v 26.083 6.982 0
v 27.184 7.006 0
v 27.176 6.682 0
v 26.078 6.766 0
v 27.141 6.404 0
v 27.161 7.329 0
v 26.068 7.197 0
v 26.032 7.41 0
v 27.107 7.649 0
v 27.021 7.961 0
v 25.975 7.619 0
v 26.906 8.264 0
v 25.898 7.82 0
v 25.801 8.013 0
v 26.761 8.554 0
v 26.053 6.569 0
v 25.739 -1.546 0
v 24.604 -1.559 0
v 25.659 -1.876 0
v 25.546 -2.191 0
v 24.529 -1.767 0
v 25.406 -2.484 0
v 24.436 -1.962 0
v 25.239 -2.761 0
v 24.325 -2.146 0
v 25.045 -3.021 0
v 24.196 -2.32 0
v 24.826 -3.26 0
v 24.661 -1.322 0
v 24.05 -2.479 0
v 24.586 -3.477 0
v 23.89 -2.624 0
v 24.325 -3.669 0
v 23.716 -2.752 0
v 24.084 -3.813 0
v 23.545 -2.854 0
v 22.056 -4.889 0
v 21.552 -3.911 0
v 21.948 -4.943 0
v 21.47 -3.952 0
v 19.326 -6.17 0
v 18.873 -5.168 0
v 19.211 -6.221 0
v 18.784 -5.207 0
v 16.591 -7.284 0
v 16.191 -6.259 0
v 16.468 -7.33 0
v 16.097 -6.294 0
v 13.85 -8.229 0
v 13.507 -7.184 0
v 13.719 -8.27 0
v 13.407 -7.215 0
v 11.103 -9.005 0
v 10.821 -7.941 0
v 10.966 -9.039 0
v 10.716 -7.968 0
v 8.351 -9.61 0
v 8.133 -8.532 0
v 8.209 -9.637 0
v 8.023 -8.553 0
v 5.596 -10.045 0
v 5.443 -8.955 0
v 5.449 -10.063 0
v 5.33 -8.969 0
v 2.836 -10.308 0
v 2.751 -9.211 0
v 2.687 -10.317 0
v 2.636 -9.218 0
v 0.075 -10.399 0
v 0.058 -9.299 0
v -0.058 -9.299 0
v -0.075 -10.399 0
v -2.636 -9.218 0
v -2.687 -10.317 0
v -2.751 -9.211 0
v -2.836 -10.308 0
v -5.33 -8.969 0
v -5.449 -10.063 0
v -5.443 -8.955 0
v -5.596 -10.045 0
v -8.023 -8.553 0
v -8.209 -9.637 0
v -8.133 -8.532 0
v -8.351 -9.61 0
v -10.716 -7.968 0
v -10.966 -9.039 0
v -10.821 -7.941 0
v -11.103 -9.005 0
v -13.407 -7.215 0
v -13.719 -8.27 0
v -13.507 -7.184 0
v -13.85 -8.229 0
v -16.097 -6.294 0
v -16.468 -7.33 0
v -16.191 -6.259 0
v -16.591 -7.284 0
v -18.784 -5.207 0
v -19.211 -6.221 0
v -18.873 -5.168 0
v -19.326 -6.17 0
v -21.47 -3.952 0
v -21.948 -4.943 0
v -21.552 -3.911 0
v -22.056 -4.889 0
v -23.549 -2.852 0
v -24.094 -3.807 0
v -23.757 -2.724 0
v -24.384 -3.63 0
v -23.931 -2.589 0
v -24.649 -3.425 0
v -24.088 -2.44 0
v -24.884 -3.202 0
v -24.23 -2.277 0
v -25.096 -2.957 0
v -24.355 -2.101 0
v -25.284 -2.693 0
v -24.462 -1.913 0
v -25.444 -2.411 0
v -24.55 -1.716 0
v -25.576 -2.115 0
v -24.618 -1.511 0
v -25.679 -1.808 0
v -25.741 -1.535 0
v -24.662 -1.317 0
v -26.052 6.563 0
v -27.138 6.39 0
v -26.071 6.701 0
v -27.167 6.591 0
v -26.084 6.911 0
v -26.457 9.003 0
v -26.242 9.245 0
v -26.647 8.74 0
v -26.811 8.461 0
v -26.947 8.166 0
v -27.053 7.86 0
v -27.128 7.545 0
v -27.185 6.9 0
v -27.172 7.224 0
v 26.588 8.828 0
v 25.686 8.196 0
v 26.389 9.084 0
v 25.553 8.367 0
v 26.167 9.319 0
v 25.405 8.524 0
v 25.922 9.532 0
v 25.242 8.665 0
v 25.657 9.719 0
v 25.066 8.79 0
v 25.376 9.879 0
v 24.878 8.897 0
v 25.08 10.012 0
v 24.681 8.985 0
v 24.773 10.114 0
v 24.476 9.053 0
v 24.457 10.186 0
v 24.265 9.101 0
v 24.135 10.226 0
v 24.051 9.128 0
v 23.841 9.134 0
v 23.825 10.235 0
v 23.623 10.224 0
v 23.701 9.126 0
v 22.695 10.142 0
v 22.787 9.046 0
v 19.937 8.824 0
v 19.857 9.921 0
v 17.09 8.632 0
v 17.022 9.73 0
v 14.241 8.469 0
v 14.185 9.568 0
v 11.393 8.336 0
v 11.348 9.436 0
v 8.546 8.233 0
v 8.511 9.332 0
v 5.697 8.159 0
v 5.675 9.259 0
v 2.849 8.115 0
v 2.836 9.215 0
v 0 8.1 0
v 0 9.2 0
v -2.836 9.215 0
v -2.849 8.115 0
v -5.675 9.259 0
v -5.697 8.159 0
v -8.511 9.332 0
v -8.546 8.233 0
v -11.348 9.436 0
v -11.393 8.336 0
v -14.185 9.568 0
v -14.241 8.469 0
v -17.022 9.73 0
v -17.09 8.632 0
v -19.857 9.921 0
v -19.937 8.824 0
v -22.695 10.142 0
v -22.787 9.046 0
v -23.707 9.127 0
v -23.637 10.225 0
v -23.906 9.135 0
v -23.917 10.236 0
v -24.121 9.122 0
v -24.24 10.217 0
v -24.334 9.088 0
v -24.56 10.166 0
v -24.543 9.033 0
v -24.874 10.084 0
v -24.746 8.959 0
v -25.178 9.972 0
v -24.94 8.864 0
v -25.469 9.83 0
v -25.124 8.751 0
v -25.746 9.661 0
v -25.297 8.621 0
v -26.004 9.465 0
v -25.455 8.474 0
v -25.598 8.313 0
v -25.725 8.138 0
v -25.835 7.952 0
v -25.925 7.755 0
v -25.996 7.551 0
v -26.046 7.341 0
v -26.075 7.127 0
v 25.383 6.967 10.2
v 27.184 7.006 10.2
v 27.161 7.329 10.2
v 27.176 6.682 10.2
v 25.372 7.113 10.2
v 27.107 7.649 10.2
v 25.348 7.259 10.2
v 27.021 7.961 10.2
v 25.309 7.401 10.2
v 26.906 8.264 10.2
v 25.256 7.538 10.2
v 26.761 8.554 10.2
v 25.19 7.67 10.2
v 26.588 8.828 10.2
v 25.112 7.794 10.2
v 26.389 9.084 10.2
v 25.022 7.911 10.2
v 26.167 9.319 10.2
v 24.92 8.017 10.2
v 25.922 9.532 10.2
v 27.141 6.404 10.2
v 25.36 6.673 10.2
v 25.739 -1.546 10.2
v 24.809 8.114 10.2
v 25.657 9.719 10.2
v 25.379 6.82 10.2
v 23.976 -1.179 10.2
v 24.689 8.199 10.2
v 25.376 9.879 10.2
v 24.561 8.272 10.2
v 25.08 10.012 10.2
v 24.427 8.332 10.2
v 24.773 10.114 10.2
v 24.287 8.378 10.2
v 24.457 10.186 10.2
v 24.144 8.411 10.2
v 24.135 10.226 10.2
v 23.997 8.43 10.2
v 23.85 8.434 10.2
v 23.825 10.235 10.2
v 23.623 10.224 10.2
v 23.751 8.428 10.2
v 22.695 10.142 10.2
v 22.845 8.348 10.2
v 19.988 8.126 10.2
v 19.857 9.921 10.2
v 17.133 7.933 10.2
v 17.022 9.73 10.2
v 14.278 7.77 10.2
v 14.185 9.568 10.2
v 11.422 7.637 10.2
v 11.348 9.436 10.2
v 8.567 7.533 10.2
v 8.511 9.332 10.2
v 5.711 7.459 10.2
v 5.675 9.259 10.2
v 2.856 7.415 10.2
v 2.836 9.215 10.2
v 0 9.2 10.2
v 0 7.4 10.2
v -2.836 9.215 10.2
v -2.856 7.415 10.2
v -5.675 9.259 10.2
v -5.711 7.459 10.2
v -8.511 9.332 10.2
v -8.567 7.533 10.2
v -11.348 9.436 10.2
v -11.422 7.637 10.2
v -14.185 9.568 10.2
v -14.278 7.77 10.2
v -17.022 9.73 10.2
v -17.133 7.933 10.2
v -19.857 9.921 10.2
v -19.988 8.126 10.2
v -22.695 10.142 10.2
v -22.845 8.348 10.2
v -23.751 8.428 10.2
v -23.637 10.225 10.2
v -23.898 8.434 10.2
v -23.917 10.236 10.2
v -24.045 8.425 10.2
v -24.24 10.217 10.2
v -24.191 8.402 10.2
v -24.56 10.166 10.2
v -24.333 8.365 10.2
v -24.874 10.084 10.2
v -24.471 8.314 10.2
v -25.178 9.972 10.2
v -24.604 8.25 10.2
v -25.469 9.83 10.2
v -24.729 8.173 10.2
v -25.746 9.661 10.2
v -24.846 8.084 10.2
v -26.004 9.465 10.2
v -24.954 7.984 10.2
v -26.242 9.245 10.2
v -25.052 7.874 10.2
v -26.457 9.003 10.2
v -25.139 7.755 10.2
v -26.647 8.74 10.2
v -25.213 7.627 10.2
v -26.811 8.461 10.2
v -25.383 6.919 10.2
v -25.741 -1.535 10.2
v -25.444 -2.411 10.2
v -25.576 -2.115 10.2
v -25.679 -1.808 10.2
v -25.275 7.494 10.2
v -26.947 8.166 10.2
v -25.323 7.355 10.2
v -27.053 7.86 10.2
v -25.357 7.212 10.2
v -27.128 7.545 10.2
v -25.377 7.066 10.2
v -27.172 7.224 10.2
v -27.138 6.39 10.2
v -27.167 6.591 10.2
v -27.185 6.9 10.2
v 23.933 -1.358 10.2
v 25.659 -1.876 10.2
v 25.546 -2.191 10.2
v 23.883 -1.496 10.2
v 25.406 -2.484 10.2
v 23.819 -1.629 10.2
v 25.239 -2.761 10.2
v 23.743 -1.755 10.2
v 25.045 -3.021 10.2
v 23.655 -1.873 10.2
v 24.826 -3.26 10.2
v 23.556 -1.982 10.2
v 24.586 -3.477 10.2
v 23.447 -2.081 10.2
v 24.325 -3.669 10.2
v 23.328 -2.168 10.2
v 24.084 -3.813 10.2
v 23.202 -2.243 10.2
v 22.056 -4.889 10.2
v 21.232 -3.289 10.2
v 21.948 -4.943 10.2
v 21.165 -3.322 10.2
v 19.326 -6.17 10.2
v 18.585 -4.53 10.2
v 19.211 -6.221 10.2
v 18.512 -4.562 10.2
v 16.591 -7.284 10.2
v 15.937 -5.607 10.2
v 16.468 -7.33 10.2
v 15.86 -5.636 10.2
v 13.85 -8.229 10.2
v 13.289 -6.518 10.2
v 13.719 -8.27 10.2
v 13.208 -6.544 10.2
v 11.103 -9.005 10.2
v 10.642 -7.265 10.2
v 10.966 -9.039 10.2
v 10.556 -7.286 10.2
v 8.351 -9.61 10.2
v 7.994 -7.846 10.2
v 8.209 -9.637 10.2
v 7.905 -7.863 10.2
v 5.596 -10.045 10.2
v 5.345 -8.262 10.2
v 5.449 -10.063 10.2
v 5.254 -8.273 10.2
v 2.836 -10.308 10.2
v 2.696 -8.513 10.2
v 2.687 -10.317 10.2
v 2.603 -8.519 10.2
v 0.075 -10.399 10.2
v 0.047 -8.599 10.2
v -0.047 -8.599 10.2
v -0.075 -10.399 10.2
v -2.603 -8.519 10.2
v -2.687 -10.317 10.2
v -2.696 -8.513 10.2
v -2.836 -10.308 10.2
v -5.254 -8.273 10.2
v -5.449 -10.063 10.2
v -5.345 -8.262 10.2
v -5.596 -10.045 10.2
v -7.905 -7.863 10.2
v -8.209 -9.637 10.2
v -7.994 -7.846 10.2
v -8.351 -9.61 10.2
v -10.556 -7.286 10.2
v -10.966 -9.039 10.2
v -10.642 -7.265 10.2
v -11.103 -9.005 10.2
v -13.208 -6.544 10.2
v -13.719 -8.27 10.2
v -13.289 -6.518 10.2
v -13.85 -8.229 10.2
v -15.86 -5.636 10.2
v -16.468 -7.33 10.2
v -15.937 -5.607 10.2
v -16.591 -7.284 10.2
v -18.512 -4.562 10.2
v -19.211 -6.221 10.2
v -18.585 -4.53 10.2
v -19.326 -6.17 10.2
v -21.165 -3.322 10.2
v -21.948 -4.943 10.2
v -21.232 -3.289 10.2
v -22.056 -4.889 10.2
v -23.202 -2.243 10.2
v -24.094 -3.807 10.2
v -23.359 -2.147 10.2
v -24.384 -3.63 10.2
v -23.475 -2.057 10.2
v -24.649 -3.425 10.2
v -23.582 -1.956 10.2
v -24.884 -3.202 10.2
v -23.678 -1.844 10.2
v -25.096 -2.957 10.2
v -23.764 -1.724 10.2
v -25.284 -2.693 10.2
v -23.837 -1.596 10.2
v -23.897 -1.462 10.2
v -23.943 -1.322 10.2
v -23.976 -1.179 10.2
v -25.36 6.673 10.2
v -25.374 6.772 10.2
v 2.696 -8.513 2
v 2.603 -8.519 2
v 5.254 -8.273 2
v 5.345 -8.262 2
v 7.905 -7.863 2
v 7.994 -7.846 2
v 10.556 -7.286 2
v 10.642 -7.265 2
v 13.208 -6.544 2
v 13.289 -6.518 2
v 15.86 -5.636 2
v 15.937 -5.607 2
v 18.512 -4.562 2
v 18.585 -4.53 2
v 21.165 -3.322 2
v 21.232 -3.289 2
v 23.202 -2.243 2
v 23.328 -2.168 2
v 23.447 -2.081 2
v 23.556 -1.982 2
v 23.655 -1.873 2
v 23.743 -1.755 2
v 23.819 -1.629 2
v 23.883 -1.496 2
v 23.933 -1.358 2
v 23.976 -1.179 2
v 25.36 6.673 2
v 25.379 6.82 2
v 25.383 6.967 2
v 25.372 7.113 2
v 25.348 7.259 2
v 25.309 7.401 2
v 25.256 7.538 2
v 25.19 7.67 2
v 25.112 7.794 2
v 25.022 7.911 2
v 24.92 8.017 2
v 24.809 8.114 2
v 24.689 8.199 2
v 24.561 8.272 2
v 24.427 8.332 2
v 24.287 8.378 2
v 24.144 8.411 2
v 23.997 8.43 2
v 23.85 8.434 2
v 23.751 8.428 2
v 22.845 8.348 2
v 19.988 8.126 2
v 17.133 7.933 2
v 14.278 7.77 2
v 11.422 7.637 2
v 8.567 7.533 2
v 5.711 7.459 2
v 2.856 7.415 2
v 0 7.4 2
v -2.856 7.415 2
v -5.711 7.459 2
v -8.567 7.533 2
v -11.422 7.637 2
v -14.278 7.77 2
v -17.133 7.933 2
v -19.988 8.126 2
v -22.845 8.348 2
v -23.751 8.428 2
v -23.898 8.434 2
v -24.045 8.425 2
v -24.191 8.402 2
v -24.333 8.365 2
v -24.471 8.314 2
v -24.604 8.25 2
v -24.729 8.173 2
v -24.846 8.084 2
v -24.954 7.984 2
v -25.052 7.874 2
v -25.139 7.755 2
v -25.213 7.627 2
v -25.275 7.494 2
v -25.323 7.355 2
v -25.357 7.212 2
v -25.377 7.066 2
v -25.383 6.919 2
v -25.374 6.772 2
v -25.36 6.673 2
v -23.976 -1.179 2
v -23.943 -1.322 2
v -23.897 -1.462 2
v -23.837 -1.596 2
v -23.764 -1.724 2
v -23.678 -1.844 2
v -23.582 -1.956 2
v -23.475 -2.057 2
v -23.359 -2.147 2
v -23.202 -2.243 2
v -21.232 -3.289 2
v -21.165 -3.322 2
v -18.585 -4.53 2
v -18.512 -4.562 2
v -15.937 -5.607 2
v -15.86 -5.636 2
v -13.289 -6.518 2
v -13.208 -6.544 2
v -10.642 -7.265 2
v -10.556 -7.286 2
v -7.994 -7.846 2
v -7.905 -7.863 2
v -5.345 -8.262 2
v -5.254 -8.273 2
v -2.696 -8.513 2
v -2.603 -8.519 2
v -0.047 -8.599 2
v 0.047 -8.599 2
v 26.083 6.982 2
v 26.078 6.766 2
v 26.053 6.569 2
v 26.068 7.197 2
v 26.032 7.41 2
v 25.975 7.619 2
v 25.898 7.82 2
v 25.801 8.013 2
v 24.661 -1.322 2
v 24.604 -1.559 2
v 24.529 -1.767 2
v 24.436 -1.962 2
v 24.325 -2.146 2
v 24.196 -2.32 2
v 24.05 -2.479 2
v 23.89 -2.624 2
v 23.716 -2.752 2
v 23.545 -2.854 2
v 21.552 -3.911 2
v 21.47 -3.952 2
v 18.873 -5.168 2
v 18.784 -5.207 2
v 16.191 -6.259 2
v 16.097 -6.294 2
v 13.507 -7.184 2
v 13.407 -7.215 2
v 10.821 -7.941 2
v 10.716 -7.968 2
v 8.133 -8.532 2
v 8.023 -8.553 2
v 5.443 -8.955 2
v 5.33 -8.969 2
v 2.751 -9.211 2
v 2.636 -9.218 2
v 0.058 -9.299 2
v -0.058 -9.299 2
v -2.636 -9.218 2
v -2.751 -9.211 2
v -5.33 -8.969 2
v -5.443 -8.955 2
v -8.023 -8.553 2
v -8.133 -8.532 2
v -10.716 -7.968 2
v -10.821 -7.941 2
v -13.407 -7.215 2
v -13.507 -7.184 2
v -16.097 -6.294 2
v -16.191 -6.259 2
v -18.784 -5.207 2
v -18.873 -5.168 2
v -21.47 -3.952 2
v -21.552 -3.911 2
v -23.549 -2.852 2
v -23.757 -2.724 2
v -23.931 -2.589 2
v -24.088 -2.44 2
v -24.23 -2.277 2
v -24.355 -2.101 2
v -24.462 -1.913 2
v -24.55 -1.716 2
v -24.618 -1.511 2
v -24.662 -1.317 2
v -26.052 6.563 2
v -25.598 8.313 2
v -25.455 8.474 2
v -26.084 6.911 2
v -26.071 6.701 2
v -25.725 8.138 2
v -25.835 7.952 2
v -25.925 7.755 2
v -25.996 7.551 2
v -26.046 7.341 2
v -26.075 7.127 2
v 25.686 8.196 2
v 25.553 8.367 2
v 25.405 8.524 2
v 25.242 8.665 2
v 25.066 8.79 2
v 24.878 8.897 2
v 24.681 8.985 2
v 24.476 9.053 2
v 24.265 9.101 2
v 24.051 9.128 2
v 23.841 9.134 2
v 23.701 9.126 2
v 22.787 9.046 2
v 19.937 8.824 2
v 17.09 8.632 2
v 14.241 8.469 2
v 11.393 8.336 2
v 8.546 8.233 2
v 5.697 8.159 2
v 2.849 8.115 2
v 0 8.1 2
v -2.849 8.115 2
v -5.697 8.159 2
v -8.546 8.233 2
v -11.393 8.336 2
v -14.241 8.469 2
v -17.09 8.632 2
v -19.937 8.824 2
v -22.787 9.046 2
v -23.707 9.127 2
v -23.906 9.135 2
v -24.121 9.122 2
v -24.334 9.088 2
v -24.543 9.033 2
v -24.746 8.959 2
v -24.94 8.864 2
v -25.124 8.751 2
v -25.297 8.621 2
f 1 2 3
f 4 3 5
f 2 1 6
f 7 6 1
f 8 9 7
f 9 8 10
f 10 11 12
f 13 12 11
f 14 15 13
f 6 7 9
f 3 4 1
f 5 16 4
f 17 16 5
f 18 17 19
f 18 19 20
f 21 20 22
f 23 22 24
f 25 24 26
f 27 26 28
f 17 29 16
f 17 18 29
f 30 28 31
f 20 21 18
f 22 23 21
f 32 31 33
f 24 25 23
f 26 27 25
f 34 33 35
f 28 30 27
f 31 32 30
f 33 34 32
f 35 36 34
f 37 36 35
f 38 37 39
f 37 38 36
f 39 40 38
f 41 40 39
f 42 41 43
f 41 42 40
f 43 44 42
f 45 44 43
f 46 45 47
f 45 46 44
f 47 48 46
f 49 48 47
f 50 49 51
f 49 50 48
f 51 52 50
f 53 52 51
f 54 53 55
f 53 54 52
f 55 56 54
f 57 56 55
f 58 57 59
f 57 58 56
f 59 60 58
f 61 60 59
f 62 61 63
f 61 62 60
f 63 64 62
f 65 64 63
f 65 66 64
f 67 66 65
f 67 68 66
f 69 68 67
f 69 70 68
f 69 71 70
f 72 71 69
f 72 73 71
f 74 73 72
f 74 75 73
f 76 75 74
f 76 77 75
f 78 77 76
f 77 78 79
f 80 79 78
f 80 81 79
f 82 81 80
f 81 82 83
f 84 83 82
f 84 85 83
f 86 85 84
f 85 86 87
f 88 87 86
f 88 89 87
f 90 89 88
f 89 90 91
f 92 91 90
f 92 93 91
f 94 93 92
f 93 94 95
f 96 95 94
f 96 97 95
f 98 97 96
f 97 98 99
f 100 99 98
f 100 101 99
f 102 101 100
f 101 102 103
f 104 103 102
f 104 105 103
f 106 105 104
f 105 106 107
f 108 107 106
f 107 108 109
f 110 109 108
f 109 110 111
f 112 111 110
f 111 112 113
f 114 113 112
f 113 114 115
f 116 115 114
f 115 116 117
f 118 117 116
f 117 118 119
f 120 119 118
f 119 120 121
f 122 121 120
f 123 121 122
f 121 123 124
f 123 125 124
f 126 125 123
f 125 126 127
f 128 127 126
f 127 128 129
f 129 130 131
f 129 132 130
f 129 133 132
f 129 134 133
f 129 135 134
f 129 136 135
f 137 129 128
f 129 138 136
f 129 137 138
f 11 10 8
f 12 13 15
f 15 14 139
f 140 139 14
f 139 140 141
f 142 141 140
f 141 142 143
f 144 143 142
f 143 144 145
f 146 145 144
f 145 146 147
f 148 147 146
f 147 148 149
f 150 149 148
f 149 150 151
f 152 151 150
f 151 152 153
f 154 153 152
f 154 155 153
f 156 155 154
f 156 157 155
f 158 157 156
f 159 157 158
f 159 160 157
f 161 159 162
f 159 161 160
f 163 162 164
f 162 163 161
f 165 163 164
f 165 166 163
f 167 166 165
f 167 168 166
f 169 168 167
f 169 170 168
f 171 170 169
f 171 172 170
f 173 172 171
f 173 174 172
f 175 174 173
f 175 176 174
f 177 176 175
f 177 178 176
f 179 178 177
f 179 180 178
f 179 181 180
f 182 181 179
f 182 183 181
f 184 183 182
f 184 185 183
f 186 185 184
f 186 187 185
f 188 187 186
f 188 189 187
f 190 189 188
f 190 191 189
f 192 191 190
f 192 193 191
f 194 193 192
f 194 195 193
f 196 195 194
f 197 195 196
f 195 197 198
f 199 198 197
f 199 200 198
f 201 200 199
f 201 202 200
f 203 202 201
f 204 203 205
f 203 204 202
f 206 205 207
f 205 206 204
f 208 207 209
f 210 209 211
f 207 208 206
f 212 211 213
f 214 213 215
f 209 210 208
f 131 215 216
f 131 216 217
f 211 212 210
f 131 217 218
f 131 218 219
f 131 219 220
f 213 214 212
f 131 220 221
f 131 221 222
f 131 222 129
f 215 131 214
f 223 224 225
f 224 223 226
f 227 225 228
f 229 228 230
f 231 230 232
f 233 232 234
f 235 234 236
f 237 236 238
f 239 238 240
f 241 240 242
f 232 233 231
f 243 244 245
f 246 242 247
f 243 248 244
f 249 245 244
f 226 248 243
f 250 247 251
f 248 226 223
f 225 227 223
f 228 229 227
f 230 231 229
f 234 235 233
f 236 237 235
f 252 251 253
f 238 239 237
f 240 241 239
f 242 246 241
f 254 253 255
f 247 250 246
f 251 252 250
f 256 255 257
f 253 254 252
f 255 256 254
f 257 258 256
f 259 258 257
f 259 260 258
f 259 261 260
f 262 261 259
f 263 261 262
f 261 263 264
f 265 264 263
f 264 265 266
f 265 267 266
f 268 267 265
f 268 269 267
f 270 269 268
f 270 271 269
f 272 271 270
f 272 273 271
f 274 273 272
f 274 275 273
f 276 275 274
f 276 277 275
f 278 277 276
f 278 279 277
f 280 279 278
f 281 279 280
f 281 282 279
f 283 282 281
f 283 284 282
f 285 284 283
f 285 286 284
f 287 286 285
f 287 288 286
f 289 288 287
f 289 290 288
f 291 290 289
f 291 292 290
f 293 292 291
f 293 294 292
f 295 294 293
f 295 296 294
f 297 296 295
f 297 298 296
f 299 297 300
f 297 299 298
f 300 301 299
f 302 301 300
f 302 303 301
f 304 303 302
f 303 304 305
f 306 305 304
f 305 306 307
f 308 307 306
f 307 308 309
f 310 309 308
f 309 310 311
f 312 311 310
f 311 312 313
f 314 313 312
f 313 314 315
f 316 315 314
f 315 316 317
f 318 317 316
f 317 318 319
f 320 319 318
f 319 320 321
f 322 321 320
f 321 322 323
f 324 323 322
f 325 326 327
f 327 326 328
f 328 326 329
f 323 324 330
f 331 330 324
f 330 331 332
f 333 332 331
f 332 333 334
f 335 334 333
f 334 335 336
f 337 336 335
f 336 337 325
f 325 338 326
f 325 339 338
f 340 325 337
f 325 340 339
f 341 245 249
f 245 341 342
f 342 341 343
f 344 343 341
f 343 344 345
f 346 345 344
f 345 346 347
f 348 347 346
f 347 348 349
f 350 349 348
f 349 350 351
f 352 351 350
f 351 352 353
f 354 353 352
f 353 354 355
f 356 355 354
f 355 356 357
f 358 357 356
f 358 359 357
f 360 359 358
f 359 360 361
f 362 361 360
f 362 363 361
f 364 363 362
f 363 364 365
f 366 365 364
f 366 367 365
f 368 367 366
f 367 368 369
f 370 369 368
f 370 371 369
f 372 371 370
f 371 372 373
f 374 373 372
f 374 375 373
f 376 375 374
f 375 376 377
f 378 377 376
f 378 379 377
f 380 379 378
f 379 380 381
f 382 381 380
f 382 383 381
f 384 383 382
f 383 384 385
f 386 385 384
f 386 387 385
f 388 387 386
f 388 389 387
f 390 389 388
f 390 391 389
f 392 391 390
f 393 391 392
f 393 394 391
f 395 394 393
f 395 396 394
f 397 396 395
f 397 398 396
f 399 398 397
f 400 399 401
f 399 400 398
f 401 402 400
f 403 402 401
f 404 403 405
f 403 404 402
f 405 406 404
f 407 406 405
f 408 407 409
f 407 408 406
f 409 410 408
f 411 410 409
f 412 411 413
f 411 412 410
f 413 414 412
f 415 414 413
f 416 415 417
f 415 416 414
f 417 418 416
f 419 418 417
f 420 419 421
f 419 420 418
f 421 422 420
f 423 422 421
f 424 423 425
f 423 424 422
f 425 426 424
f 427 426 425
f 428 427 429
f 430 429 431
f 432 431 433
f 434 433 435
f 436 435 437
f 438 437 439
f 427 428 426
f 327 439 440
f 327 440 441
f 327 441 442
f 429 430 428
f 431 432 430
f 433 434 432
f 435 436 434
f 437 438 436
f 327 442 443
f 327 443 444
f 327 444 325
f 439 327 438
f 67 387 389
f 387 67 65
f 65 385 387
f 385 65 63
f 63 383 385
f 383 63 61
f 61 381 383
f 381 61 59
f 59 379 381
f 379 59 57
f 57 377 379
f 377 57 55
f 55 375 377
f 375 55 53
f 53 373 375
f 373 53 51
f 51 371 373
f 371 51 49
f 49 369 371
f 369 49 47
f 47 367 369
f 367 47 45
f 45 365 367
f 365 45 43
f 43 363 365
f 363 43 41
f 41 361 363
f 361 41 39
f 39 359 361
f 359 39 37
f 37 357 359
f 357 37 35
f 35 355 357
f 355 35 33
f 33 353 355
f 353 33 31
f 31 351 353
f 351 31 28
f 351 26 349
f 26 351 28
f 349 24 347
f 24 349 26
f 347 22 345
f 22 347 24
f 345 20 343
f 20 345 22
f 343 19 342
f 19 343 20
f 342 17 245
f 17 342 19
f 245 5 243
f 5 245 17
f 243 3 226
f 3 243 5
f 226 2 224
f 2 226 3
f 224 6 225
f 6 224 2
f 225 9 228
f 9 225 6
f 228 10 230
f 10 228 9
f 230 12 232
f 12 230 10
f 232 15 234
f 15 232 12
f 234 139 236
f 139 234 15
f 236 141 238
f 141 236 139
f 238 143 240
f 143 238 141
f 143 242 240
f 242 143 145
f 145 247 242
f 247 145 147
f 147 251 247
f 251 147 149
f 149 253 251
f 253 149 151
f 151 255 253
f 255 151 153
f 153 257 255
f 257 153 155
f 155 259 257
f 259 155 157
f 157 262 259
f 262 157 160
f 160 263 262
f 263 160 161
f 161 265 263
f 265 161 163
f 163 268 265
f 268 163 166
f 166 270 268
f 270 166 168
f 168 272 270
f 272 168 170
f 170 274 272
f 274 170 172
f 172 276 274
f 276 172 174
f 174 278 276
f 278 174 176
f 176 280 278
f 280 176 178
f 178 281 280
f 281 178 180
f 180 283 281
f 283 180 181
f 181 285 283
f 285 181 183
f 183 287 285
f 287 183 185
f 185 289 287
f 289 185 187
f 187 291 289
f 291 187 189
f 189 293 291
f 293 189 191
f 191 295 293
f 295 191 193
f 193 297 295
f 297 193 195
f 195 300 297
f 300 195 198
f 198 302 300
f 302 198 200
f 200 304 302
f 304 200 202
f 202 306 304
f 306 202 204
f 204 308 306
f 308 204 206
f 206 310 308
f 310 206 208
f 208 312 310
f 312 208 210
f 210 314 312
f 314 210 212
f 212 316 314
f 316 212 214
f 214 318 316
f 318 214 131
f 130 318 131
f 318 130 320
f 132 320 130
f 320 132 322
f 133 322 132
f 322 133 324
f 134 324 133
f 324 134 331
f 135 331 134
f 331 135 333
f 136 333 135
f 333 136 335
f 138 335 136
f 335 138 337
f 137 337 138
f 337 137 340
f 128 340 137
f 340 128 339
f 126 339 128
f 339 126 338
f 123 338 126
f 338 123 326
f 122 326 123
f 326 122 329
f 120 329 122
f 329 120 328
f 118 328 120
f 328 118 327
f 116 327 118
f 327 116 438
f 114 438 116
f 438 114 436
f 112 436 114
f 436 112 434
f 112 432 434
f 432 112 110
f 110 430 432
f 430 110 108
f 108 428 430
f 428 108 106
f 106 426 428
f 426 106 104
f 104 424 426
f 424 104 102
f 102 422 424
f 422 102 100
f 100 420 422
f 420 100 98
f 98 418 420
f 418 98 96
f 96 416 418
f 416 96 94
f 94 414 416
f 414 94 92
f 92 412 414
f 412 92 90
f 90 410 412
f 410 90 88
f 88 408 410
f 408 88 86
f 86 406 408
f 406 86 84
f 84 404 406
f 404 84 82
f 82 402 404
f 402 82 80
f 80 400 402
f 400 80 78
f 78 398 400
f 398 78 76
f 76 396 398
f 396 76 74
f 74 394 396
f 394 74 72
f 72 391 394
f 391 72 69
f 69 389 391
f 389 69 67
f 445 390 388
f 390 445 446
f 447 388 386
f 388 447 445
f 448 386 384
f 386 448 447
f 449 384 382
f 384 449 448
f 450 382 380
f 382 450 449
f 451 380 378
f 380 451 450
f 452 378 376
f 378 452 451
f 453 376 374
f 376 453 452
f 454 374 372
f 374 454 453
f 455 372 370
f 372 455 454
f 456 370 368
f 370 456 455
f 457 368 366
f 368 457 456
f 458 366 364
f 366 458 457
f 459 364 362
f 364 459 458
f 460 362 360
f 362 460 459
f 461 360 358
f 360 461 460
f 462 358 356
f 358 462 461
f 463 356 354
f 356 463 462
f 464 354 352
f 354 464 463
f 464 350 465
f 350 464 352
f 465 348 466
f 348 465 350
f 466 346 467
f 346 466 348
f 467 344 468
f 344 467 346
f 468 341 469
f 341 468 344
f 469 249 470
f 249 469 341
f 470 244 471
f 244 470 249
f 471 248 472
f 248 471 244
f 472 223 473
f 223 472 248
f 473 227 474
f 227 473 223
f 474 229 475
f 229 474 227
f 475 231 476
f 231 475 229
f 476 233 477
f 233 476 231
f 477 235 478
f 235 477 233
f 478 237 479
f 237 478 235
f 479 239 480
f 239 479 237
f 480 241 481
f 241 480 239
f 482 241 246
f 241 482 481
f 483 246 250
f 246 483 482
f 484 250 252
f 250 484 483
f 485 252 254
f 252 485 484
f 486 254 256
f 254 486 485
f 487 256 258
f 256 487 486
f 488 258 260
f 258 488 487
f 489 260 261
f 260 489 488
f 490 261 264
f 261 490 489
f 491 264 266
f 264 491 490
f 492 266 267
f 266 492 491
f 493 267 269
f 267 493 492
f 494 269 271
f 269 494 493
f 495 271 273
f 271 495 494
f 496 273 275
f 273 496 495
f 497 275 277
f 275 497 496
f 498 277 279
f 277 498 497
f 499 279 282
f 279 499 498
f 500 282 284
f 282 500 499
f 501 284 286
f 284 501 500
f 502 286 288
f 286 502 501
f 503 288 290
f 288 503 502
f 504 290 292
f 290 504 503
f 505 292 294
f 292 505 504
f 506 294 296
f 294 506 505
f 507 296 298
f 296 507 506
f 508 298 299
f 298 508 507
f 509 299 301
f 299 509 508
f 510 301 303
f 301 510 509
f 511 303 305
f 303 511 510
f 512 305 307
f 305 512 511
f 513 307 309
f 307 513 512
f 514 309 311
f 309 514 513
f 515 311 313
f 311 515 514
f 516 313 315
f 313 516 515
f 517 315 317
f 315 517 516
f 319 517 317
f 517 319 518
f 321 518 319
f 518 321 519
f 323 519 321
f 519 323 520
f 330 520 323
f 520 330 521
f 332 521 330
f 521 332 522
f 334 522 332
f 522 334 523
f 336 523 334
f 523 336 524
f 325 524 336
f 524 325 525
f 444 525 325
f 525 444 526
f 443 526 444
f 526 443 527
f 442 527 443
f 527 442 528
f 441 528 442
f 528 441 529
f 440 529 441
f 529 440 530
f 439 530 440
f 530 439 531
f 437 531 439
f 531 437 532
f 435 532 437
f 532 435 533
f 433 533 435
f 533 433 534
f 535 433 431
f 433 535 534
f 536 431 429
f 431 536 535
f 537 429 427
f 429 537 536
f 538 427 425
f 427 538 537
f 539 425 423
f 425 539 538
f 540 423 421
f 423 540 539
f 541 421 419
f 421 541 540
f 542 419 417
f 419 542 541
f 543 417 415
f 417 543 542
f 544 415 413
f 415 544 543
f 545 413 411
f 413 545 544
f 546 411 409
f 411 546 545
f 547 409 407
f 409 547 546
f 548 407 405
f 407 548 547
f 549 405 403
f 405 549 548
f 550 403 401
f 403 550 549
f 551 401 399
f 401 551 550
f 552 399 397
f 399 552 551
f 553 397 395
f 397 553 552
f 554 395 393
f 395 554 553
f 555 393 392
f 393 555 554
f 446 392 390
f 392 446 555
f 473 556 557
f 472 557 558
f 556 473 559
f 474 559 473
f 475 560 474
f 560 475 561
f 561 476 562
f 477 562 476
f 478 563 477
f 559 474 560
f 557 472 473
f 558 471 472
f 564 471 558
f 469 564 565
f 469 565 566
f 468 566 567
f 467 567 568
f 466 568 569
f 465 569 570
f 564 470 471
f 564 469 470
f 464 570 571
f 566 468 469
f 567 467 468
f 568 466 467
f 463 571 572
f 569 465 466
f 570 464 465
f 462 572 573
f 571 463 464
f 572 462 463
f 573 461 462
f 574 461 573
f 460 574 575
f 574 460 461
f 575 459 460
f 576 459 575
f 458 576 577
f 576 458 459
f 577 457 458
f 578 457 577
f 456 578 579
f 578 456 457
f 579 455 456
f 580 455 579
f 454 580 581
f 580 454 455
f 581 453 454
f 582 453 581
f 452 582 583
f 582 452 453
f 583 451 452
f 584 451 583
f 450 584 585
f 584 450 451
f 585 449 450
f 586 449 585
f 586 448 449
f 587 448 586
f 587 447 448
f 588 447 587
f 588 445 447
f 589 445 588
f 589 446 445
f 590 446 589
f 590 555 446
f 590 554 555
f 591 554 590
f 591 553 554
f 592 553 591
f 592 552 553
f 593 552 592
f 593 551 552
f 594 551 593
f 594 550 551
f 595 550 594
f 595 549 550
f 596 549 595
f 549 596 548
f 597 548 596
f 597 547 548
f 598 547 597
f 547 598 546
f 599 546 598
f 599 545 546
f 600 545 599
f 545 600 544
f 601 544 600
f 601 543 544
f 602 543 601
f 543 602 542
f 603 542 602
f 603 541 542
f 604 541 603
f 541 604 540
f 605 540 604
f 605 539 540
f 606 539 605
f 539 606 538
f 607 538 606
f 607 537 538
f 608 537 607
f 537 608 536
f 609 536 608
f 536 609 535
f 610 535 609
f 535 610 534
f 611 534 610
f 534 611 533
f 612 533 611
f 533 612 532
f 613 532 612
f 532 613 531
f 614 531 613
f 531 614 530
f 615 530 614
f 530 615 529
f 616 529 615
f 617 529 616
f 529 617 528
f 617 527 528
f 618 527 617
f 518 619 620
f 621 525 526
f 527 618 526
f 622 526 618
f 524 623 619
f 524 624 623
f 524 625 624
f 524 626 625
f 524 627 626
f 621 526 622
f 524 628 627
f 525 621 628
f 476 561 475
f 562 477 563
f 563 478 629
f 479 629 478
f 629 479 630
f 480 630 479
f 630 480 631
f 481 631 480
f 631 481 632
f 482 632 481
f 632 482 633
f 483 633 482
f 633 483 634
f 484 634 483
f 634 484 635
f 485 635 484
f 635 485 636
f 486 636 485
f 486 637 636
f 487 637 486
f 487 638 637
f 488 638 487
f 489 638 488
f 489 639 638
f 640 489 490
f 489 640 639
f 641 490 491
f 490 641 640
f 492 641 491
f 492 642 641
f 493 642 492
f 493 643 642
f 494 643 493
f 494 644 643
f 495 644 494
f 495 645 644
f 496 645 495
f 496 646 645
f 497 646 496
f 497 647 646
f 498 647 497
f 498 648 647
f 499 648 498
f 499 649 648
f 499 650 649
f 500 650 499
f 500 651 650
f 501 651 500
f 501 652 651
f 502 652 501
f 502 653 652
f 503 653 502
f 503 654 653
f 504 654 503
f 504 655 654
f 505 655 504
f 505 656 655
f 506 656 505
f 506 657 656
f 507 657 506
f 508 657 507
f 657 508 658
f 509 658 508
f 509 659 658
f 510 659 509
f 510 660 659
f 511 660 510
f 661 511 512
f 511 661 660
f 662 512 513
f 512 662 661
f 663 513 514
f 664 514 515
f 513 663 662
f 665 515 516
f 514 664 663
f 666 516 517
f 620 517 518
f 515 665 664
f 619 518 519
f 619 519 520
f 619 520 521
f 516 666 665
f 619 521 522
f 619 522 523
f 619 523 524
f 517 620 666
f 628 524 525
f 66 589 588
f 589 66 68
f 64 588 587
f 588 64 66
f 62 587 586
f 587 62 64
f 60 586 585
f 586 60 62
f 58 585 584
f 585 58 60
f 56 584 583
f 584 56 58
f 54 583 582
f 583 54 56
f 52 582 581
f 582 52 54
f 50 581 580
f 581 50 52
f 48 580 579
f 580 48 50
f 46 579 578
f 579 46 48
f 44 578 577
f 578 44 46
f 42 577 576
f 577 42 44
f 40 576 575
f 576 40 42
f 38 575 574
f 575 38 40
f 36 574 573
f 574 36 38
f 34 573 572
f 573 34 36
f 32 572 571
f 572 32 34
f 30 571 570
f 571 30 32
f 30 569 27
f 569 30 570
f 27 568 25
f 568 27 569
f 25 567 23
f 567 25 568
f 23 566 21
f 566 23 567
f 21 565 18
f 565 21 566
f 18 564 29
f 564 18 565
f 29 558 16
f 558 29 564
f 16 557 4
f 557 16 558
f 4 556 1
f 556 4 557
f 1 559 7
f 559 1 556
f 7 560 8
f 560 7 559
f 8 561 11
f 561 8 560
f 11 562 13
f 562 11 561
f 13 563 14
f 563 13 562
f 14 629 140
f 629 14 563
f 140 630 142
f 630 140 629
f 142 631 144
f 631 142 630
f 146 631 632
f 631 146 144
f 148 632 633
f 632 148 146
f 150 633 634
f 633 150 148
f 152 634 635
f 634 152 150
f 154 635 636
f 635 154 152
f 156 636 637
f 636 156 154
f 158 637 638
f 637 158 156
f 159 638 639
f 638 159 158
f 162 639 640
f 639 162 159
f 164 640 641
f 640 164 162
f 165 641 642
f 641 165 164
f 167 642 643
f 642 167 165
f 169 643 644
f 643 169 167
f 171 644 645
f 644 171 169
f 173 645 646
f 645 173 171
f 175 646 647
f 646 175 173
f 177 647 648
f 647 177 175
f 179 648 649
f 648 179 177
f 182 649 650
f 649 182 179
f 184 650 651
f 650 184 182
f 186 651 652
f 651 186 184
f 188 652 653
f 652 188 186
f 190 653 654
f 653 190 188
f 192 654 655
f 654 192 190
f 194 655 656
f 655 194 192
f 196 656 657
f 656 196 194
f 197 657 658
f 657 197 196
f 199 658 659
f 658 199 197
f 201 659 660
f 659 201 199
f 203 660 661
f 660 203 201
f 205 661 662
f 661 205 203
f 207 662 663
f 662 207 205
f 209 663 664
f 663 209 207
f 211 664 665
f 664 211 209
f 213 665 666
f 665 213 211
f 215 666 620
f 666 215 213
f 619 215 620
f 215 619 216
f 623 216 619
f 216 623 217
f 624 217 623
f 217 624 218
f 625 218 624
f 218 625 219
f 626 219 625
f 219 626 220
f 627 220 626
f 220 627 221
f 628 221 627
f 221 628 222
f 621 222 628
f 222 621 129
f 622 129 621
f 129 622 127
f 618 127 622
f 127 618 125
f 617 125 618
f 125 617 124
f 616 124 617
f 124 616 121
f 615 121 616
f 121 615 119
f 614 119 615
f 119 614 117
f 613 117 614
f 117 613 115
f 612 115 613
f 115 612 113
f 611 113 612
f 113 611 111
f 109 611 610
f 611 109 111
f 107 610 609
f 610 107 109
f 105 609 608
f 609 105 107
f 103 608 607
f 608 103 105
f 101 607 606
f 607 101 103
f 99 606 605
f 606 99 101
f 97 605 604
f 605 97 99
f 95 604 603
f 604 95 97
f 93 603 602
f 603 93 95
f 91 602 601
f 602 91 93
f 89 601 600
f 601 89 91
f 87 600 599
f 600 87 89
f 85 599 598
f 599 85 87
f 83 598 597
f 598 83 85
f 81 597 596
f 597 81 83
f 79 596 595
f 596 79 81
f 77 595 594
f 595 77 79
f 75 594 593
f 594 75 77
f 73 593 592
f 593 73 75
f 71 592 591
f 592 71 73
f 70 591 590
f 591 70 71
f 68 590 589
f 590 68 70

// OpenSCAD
/*
  Shark WV201 nozzle fit-test ring

  This is a low-material test part using the same nozzle-opening profile as
  the current full adapter. Print this first to check whether the shaped
  opening slips onto the actual Shark vacuum attachment point.
*/

$fn = 64;

// --- Shark nozzle profile copied from current adapter ---
shark_nozzle_top_w = 51.4;          // mm
shark_nozzle_side_drop = 10.5;      // mm
shark_nozzle_side_angle = 80;     // degrees from top edge; 90 = vertical sides
shark_nozzle_top_curve_rise = 1.2;// mm, slight downward bow at top center
shark_nozzle_curve_drop = 6.7;    // mm
shark_nozzle_wall = 1.8;            // mm wall thickness
shark_nozzle_corner_r = 1.5;      // mm, rounds sharp corners on nozzle profile

// --- Fit-test dimensions ---
test_depth = 10.2;                  // mm, short sleeve for quick printing
lead_in_depth = 2;                // mm, chamfered mouth to help it start
lead_in_clearance = 0.7;          // mm, extra clearance at the entry face

// --- Derived ---
shark_nozzle_side_inset = shark_nozzle_side_drop / tan(shark_nozzle_side_angle);
shark_nozzle_bottom_w = shark_nozzle_top_w - 2 * shark_nozzle_side_inset;
shark_nozzle_h = shark_nozzle_side_drop + shark_nozzle_curve_drop;

// Makes the base 2D Shark nozzle profile. The top bows slightly downward, the
// sides lean slightly inward, and the bottom is a tunable smooth curve.
module shark_nozzle_base_profile_2d() {
  top_w = shark_nozzle_top_w;
  bottom_w = shark_nozzle_bottom_w;
  h = shark_nozzle_h;
  curve_drop = shark_nozzle_curve_drop;
  curve_y = curve_drop;
  top_y = h;
  y_shift = h / 2;
  steps = 18;

  lower_right = [bottom_w/2, curve_y - y_shift];
  lower_left = [-bottom_w/2, curve_y - y_shift];

  top_points = [
    for (i = [0:steps])
      let(
        t = i / steps,
        x = -top_w/2 + t * top_w,
        y = top_y - shark_nozzle_top_curve_rise * (1 - pow(x / (top_w/2), 2)) - y_shift
      )
      [x, y]
  ];

  curve_points = [
    for (i = [0:steps])
      let(
        t = i / steps,
        x = bottom_w/2 - t * bottom_w,
        y = curve_drop * pow(x / (bottom_w/2), 2) - y_shift
      )
      [x, y]
  ];

  offset(r = shark_nozzle_corner_r)
    offset(delta = -shark_nozzle_corner_r)
      polygon(concat(top_points, [lower_right], curve_points, [lower_left]));
}

// Offsets the base profile so the outer ring gets uniform wall thickness.
module shark_nozzle_profile_2d(extra = 0) {
  if (extra == 0) {
    shark_nozzle_base_profile_2d();
  } else {
    offset(delta = extra)
      shark_nozzle_base_profile_2d();
  }
}

// Low-material sleeve: a short hollow profile with a slight lead-in.
module fit_test_ring() {
  difference() {
    linear_extrude(height = test_depth)
      shark_nozzle_profile_2d(shark_nozzle_wall);

    translate([0, 0, -0.5])
      linear_extrude(height = test_depth + 1)
        shark_nozzle_profile_2d(0);

    translate([0, 0, -0.5])
      linear_extrude(height = lead_in_depth + 0.5)
        shark_nozzle_profile_2d(lead_in_clearance);
  }
}

fit_test_ring();
